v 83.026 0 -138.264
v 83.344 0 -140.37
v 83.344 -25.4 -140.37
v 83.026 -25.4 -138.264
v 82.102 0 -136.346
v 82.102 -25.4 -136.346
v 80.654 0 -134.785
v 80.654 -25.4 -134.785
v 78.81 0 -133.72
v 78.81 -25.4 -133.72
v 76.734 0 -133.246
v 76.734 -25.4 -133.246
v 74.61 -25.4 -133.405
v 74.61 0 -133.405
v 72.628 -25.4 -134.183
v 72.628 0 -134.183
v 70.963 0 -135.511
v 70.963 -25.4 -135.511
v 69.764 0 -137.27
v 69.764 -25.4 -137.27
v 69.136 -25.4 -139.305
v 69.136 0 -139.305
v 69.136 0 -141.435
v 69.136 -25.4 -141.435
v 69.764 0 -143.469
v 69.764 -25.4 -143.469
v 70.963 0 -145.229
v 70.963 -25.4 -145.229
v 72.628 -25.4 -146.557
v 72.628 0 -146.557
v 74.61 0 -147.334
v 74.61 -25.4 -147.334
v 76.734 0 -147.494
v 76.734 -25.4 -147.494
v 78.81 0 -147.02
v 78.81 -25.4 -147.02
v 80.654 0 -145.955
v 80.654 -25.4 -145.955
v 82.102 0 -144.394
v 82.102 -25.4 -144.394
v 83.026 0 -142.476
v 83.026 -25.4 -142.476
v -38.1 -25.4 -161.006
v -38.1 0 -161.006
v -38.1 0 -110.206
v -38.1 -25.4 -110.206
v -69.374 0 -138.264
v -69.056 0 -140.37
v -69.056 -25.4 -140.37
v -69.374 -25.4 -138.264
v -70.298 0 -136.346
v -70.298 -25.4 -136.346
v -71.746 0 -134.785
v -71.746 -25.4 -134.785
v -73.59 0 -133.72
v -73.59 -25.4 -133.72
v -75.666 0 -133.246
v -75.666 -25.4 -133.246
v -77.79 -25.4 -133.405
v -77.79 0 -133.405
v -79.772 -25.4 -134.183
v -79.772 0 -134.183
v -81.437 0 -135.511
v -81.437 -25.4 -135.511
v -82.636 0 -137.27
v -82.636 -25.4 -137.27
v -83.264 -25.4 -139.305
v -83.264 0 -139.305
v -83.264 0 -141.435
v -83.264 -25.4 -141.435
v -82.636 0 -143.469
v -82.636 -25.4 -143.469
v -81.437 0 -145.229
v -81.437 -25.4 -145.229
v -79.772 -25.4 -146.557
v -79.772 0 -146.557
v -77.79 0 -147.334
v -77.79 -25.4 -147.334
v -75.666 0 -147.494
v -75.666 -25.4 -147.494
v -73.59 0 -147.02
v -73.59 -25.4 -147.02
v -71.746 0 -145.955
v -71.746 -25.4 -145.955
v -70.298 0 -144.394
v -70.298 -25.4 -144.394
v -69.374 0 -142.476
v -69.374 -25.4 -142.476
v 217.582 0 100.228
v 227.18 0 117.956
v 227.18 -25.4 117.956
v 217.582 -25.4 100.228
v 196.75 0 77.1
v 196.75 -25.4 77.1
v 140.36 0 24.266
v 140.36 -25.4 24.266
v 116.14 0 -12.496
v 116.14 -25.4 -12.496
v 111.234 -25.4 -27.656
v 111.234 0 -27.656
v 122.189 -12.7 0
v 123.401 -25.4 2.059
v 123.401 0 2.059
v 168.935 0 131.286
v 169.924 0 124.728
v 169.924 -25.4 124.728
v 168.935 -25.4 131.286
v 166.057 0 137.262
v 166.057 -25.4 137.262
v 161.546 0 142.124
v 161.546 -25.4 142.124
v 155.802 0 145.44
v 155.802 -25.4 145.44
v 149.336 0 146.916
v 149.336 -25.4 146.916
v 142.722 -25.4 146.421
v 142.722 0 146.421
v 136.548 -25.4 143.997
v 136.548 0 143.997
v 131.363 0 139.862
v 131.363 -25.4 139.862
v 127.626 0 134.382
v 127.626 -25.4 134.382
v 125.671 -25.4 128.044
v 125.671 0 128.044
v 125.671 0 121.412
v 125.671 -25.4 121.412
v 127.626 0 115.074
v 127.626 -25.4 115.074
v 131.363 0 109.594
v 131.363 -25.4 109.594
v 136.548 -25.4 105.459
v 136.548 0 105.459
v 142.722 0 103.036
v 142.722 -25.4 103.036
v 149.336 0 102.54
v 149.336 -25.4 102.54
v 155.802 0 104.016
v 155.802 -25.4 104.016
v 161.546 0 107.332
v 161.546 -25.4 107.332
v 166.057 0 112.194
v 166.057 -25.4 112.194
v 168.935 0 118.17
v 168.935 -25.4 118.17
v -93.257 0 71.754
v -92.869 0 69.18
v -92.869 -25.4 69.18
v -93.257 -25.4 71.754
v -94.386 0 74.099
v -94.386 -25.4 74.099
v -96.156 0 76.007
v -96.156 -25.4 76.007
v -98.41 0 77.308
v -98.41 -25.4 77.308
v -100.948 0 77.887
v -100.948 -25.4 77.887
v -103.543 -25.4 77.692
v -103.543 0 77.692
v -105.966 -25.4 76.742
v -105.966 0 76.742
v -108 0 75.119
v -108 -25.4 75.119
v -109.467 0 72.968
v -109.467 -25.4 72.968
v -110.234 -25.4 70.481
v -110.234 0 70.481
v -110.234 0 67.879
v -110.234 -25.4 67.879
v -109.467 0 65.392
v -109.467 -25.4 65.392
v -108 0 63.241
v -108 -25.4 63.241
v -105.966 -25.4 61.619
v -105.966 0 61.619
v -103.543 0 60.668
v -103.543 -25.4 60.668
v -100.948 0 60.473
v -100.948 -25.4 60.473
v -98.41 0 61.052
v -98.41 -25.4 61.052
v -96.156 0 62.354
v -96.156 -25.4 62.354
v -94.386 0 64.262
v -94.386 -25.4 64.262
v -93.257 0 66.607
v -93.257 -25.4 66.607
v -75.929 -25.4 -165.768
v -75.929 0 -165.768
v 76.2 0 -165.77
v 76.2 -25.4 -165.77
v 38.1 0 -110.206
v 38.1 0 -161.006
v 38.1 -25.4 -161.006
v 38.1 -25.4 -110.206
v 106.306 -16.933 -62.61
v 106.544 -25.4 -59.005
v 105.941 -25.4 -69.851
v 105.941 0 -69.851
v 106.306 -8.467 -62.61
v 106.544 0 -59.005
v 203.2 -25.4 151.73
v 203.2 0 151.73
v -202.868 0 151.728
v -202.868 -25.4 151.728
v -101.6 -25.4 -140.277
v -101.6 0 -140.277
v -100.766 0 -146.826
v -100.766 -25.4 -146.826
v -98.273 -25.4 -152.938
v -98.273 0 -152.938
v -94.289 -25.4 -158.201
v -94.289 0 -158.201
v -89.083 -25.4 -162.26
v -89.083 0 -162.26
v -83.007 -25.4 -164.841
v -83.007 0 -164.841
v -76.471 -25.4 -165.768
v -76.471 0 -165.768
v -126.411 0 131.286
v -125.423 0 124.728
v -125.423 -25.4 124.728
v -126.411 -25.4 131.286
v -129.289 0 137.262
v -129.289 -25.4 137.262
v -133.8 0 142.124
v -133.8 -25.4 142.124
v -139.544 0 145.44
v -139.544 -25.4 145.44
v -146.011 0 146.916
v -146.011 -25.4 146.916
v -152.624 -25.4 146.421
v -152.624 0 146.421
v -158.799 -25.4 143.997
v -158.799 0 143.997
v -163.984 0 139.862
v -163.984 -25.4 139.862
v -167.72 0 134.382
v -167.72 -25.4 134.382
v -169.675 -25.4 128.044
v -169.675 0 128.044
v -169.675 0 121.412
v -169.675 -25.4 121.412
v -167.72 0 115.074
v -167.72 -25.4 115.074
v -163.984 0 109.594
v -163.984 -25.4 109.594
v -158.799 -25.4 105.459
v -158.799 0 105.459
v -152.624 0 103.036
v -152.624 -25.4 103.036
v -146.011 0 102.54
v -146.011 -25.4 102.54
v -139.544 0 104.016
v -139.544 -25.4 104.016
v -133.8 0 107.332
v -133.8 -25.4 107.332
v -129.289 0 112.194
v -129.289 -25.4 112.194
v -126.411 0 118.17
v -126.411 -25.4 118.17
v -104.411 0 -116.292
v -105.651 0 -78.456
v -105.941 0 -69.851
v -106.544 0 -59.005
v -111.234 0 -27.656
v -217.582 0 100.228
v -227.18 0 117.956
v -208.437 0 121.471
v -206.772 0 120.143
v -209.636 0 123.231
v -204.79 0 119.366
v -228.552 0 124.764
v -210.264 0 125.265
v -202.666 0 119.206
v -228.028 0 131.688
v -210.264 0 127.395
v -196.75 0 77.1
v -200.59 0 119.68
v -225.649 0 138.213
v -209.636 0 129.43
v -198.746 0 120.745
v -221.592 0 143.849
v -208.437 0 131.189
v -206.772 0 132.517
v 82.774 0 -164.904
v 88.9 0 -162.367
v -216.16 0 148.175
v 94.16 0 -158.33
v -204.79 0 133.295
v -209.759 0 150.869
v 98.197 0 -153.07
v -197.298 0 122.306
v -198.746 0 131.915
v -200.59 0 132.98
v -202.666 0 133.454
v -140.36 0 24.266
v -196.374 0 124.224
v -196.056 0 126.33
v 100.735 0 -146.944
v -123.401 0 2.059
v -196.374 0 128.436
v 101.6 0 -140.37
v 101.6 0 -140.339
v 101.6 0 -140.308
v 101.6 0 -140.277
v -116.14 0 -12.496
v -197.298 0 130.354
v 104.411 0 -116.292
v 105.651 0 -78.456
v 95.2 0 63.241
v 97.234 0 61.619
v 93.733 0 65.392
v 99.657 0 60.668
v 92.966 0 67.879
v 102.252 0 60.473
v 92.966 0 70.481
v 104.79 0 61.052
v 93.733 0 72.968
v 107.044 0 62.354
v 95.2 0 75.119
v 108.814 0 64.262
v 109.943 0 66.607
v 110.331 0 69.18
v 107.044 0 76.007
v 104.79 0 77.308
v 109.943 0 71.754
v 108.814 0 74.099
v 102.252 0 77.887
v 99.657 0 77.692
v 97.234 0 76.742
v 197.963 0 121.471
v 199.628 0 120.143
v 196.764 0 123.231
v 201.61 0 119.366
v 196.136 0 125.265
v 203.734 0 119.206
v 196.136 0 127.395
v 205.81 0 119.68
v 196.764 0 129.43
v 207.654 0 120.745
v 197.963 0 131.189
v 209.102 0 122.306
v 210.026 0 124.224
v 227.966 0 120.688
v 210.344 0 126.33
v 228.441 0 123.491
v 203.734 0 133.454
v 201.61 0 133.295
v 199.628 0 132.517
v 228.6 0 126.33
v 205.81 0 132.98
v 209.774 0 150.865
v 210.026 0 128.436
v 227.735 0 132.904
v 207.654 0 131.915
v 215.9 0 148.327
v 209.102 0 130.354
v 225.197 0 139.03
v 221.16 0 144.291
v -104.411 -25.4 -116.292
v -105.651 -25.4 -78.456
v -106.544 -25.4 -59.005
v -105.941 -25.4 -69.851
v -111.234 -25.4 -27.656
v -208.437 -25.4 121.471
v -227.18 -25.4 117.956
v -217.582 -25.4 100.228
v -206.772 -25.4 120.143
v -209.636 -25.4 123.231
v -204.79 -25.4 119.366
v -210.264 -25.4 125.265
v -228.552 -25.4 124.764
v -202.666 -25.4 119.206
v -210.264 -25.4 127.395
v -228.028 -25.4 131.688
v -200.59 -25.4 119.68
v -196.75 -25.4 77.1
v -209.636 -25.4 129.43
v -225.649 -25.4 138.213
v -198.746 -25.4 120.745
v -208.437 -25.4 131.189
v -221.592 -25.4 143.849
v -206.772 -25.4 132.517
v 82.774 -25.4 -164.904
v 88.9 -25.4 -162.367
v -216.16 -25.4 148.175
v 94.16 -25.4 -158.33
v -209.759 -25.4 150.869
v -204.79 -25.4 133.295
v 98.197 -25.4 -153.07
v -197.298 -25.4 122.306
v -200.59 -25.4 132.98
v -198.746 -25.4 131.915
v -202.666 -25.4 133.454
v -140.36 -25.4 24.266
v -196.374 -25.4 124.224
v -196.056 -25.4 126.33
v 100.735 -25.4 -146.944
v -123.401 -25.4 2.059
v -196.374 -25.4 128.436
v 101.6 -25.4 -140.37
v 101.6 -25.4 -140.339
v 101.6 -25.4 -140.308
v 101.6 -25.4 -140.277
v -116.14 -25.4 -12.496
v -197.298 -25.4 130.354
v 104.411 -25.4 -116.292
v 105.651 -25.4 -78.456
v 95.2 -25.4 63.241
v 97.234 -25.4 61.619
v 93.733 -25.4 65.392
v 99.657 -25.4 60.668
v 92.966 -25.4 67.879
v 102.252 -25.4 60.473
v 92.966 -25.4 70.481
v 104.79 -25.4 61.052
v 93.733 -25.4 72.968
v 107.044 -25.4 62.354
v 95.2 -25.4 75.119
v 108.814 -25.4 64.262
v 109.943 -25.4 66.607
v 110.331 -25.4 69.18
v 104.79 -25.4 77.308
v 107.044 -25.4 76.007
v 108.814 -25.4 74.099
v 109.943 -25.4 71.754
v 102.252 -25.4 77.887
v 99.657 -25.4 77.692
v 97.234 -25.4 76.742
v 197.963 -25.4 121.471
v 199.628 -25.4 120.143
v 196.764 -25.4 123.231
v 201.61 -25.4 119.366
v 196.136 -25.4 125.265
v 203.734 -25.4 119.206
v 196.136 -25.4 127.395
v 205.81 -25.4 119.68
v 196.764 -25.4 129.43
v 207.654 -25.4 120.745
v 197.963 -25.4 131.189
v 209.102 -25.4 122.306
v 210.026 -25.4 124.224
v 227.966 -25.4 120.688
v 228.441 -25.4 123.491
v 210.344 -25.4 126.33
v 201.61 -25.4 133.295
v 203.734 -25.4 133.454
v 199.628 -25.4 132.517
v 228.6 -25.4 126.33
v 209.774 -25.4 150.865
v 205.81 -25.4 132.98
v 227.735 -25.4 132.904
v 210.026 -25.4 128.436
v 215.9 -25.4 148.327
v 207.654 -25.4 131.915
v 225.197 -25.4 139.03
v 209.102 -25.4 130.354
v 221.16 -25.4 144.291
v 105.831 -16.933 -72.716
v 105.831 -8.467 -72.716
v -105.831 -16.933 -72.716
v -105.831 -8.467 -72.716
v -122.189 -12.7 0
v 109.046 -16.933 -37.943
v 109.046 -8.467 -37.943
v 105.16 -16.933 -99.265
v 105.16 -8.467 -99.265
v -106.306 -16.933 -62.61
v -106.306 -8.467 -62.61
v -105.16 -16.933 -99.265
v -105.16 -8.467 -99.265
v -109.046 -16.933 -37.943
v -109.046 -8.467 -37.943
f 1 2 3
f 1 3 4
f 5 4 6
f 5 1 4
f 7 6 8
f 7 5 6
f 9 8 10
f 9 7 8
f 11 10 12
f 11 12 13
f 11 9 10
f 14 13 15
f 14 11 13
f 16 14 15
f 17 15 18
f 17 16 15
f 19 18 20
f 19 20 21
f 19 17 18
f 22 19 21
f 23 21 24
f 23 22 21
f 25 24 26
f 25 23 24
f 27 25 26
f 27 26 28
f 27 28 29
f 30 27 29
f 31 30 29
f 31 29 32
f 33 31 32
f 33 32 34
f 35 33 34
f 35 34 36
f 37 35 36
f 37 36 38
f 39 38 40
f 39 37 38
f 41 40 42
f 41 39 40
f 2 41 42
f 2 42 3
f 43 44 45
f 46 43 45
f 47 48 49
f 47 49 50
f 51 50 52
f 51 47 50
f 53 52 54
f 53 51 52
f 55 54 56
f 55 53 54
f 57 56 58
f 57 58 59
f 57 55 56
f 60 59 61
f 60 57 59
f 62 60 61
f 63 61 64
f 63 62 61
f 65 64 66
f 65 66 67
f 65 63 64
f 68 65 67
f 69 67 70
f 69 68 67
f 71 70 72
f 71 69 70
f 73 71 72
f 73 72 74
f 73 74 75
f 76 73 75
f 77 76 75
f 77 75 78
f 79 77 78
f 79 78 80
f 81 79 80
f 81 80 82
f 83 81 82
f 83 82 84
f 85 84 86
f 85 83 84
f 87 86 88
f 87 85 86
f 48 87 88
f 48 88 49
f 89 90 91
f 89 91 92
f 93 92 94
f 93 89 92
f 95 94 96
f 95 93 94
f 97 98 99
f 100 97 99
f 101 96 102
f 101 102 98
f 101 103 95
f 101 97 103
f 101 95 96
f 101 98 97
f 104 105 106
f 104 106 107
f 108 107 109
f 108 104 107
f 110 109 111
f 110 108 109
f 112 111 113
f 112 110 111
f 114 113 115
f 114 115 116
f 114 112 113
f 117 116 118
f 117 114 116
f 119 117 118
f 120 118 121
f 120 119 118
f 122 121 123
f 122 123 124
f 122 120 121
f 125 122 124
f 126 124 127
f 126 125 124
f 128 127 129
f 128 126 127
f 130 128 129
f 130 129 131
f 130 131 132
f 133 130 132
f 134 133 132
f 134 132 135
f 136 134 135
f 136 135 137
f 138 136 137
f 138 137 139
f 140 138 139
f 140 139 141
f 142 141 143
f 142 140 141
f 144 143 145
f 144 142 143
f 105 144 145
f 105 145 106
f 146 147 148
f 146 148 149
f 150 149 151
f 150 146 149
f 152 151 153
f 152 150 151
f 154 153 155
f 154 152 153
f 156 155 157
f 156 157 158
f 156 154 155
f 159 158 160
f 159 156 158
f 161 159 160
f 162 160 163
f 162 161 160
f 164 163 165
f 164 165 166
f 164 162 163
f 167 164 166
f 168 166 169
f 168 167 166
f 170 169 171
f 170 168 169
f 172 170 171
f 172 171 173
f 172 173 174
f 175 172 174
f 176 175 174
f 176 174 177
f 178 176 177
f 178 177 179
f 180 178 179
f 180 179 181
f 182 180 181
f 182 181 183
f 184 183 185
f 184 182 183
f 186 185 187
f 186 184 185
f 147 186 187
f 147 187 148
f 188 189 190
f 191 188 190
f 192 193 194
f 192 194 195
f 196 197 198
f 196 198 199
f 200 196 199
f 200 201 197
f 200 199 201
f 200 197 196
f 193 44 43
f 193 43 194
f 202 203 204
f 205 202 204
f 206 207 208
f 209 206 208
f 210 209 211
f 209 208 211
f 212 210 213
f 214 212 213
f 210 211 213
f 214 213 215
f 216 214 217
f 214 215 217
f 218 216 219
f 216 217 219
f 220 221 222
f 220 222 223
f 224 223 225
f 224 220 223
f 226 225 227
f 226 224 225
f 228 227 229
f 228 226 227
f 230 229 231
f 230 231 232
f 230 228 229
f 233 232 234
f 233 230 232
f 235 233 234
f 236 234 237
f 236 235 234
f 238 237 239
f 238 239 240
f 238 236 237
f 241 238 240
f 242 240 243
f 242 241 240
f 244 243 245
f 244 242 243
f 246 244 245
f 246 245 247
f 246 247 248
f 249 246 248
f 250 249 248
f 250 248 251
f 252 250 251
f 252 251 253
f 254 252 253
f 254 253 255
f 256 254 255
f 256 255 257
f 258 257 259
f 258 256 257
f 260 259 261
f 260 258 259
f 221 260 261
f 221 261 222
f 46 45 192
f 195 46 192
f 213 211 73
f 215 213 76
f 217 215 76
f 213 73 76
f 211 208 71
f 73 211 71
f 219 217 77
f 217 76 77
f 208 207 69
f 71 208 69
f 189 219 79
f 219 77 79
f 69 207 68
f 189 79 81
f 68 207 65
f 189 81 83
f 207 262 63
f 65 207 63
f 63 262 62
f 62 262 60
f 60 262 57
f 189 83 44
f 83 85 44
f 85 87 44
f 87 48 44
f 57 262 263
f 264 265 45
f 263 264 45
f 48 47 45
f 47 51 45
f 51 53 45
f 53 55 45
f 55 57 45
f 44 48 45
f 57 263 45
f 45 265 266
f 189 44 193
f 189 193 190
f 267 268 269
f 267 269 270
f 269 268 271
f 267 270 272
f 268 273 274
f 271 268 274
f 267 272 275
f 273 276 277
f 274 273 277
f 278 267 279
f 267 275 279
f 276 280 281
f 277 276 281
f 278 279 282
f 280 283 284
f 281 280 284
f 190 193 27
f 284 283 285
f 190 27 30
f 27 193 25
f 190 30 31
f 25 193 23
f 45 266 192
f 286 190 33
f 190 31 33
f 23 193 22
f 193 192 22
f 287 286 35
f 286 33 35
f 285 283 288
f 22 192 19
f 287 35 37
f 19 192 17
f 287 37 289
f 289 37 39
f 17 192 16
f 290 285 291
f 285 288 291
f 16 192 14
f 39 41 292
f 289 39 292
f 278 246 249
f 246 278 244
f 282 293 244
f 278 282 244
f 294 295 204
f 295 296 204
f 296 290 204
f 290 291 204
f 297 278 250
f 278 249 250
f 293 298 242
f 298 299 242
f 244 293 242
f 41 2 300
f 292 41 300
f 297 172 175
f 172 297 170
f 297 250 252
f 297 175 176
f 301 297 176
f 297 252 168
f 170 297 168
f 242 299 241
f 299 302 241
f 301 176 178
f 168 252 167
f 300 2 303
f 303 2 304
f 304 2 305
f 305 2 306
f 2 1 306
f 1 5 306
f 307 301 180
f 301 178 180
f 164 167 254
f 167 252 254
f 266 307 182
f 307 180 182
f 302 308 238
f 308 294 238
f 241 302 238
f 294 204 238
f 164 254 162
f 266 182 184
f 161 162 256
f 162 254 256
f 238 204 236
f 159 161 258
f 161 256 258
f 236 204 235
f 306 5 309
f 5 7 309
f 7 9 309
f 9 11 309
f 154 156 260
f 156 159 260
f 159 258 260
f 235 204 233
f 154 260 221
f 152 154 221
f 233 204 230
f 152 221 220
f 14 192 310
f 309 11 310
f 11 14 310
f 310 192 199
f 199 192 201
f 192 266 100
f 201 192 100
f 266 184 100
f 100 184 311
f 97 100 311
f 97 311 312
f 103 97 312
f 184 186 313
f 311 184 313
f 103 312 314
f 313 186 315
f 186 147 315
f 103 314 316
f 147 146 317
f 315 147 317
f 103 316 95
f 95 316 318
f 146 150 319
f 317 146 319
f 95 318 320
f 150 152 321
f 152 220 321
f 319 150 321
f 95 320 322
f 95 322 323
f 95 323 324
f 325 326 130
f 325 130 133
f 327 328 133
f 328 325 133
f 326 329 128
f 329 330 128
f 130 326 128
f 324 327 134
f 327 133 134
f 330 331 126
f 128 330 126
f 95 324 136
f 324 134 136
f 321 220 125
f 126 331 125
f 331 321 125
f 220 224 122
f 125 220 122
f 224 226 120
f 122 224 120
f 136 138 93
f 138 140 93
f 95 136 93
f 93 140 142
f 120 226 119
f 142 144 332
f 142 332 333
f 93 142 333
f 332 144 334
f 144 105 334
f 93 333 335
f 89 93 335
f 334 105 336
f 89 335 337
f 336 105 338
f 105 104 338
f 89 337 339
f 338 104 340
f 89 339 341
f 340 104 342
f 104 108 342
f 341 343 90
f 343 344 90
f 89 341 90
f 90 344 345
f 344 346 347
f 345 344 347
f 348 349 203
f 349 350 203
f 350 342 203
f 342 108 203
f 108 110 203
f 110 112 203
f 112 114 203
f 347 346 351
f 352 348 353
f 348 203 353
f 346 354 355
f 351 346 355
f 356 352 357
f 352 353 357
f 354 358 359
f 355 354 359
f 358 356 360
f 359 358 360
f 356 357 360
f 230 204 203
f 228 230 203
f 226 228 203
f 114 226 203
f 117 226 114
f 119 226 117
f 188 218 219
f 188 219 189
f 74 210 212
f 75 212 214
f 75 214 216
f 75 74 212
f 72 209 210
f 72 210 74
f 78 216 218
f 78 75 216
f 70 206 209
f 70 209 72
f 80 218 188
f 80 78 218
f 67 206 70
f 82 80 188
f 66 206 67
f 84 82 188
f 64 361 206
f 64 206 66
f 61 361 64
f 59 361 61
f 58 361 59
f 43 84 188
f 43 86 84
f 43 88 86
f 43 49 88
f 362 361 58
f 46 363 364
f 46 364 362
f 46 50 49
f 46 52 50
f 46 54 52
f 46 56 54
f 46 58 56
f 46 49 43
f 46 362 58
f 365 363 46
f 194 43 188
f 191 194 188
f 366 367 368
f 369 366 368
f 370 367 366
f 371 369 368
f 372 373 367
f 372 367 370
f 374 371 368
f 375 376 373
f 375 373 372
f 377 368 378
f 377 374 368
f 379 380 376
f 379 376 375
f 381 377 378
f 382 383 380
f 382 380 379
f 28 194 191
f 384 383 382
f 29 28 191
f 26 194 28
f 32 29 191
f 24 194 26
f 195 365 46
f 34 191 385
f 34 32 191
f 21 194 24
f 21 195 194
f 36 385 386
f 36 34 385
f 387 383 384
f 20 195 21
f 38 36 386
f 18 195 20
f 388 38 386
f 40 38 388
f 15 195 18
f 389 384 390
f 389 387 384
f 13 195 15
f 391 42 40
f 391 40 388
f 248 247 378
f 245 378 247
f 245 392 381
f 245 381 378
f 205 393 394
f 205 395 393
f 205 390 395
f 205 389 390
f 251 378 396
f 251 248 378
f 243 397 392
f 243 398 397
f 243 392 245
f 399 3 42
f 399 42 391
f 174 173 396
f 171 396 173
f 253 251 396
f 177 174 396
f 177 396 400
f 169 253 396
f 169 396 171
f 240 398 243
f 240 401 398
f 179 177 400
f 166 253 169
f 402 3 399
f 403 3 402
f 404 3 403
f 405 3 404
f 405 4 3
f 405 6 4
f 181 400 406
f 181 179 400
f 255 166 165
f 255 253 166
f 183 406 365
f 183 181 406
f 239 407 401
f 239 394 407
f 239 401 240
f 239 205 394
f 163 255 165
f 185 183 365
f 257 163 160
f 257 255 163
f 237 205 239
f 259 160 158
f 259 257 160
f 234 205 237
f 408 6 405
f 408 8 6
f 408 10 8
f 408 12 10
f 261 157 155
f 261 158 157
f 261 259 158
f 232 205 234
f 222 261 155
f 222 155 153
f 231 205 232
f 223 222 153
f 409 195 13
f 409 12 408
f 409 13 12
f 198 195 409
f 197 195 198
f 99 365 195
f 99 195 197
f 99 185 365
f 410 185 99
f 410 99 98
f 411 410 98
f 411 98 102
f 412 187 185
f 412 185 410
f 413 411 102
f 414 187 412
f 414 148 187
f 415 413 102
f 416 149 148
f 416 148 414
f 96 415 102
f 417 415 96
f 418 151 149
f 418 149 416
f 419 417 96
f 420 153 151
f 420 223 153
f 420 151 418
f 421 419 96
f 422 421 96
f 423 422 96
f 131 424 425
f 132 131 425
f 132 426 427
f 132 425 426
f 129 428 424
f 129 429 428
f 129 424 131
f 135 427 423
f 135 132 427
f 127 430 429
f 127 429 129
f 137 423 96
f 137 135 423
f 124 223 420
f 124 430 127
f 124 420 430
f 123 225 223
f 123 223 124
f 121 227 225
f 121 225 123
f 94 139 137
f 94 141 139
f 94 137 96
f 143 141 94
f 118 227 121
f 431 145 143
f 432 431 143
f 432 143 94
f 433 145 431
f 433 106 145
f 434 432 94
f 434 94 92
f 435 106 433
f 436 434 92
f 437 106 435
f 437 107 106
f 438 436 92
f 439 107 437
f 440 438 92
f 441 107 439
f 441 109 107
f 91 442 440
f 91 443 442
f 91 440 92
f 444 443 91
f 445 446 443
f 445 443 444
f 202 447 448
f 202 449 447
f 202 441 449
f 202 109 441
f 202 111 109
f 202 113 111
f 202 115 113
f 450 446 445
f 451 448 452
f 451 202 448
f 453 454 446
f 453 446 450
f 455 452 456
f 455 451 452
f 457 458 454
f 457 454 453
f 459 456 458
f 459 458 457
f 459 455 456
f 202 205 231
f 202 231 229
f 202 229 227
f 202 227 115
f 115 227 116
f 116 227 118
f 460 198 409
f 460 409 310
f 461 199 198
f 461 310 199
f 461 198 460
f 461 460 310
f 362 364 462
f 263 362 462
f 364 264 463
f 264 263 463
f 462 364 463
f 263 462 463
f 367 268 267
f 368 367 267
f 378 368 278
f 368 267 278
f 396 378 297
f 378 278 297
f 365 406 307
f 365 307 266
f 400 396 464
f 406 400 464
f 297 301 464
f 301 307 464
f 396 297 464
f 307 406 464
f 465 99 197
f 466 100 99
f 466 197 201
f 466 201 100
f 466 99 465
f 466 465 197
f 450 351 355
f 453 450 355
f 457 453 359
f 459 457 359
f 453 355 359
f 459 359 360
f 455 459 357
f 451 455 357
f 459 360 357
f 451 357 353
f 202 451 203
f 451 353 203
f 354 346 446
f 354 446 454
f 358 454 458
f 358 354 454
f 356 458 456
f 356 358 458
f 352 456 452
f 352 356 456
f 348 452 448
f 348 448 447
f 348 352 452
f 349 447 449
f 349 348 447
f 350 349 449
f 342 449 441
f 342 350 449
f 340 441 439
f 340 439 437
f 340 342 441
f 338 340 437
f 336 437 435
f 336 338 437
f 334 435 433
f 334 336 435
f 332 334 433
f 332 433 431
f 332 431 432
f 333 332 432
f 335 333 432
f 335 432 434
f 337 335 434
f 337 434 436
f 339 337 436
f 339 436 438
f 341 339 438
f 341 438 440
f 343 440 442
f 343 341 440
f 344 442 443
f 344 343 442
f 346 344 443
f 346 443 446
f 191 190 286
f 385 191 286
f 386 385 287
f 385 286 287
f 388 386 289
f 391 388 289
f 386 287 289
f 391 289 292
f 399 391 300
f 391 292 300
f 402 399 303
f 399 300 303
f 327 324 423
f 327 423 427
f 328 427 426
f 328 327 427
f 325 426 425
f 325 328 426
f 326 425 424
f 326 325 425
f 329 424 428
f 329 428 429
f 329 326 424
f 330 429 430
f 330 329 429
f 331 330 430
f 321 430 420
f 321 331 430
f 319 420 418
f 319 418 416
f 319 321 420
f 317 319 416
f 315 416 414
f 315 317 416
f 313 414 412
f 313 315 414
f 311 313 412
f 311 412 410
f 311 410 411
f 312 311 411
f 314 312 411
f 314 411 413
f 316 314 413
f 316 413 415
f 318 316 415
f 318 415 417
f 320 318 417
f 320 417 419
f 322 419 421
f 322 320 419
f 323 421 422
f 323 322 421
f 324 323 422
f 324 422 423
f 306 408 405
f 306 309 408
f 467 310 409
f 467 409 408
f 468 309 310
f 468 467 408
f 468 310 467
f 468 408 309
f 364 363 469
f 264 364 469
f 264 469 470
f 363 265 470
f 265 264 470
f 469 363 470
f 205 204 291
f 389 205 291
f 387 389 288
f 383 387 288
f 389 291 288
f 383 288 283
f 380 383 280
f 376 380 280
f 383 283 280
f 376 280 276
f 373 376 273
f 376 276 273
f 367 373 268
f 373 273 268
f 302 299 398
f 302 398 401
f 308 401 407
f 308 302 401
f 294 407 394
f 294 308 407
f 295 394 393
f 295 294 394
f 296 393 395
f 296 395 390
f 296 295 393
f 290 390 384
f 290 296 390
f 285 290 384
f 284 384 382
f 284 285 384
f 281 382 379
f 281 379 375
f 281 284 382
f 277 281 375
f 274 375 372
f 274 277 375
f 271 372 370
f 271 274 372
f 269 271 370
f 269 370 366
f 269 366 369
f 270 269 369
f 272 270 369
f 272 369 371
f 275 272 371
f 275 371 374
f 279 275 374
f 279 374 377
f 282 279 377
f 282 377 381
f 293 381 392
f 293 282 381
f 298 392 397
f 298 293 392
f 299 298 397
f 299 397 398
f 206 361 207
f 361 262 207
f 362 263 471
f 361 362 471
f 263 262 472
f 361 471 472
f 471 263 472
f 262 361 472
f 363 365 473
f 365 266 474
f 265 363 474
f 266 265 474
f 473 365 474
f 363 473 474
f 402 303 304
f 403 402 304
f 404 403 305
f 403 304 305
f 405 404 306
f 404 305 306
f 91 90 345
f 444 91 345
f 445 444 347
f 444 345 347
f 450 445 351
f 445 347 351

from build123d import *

# Parameters (mm, degrees)
F0_R     = 7.14375
F0_R_2   = 8.73125
F0_R_3   = 22.2504
F0_W     = 76.2
F0_H     = 50.8
F1_DEPTH = 25.4


with BuildPart() as f1:
    # F0 (on Front) → F1 (new body)
    with BuildSketch(Plane.XZ):
        with BuildLine():
            ThreePointArc((-227.1798288962, 117.9559066231), (-198.9530984214, 101.2877007654), (-177.8, 126.3301412811))
            ThreePointArc((-177.8, 126.3301412811), (-185.1223559639, 144.1727528082), (-202.8676209531, 151.7279664669))
            ThreePointArc((-202.8676209531, 151.7279664669), (-223.8140359372, 141.1700038944), (-227.1798288962, 117.9559066231))
        make_face()
        with Locations((-203.2, 126.3301412811)):
            Circle(F0_R, mode=Mode.SUBTRACT)
        with BuildLine():
            ThreePointArc((-202.8676209531, 151.7279664669), (-185.1223559639, 144.1727528082), (-177.8, 126.3301412811))
            ThreePointArc((-177.8, 126.3301412811), (-198.9530984214, 101.2877007654), (-227.1798288962, 117.9559066231))
            add(Edge.make_bspline(
                [(-227.1798288962, 117.9559066231), (-213.6418582626, 78.8128585754), (-134.6303143568, 37.7909136067), (-113.6413747749, -18.1169363843), (-111.2338181852, -27.6559796071)],
                knots=[0, 0, 0, 0, 0.5134678559, 0.6154322526, 0.6154322526, 0.6154322526, 0.6154322526], degree=3))
            Line((-111.2338181852, -27.6559796071), (111.2338181852, -27.6559796071))
            add(Edge.make_bspline(
                [(227.1798288962, 117.9559066231), (213.6418582626, 78.8128585754), (134.6303143568, 37.7909136067), (113.6413747749, -18.1169363843), (111.2338181852, -27.6559796071)],
                knots=[0, 0, 0, 0, 0.5134678559, 0.6154322526, 0.6154322526, 0.6154322526, 0.6154322526], degree=3))
            ThreePointArc((227.1798288962, 117.9559066231), (182.4893469663, 111.6254192192), (203.1998639628, 151.7301412808))
            Line((203.1998639628, 151.7301412808), (-202.8676209531, 151.7279664669))
        make_face()
        with Locations((-101.6, 69.1801412811)):
            Circle(F0_R_2, mode=Mode.SUBTRACT)
        with Locations((-147.6733071194, 124.7280620759)):
            Circle(F0_R_3, mode=Mode.SUBTRACT)
        with Locations((101.6, 69.1801412811)):
            Circle(F0_R_2, mode=Mode.SUBTRACT)
        with Locations((147.6733071194, 124.7280620759)):
            Circle(F0_R_3, mode=Mode.SUBTRACT)
        with BuildLine():
            ThreePointArc((228.6, 126.3301412811), (221.1604641457, 144.2907016196), (203.1998639628, 151.7301412808))
            ThreePointArc((203.1998639628, 151.7301412808), (182.4893469663, 111.6254192192), (227.1798288962, 117.9559066231))
            ThreePointArc((227.1798288962, 117.9559066231), (228.2424405157, 122.0832397026), (228.6, 126.3301412811))
        make_face()
        with Locations((203.2, 126.3301412811)):
            Circle(F0_R, mode=Mode.SUBTRACT)
        with BuildLine():
            Line((111.2338181852, -27.6559796071), (-111.2338181852, -27.6559796071))
            add(Edge.make_bspline(
                [(-111.2338181852, -27.6559796071), (-108.6624430935, -37.8440924207), (-107.3114943085, -48.3473495809), (-106.5439984378, -59.0045117357)],
                knots=[0.6154322526, 0.6154322526, 0.6154322526, 0.6154322526, 0.7243346607, 0.7243346607, 0.7243346607, 0.7243346607], degree=3))
            ThreePointArc((-106.5439984378, -59.0045117357), (-98.7916333235, -57.5943734425), (-94.4499, -64.1698587189))
            ThreePointArc((-94.4499, -64.1698587189), (-98.4312031682, -70.5794341064), (-105.9413914893, -69.8510777735))
            add(Edge.make_bspline(
                [(-105.9413914893, -69.8510777735), (-105.8225617688, -72.7133360171), (-105.7298757075, -75.582653183), (-105.6512856578, -78.4559796071)],
                knots=[0.7611223242, 0.7611223242, 0.7611223242, 0.7611223242, 0.7901378963, 0.7901378963, 0.7901378963, 0.7901378963], degree=3))
            Line((-105.6512856578, -78.4559796071), (105.6512856578, -78.4559796071))
            add(Edge.make_bspline(
                [(105.9413914893, -69.8510777735), (105.8225617688, -72.7133360171), (105.7298757075, -75.582653183), (105.6512856578, -78.4559796071)],
                knots=[0.7611223242, 0.7611223242, 0.7611223242, 0.7611223242, 0.7901378963, 0.7901378963, 0.7901378963, 0.7901378963], degree=3))
            ThreePointArc((105.9413914893, -69.8510777735), (94.4609093557, -63.7732294435), (106.5439984378, -59.0045117357))
            add(Edge.make_bspline(
                [(111.2338181852, -27.6559796071), (108.6624430935, -37.8440924207), (107.3114943085, -48.3473495809), (106.5439984378, -59.0045117357)],
                knots=[0.6154322526, 0.6154322526, 0.6154322526, 0.6154322526, 0.7243346607, 0.7243346607, 0.7243346607, 0.7243346607], degree=3))
        make_face()
        with BuildLine():
            ThreePointArc((-94.4499, -64.1698587189), (-98.7916333235, -57.5943734425), (-106.5439984378, -59.0045117357))
            add(Edge.make_bspline(
                [(-106.5439984378, -59.0045117357), (-106.2847353017, -62.6045431988), (-106.0920508575, -66.2221369929), (-105.9413914893, -69.8510777735)],
                knots=[0.7243346607, 0.7243346607, 0.7243346607, 0.7243346607, 0.7611223242, 0.7611223242, 0.7611223242, 0.7611223242], degree=3))
            ThreePointArc((-105.9413914893, -69.8510777735), (-98.4312031682, -70.5794341064), (-94.4499, -64.1698587189))
        make_face()
        with BuildLine():
            add(Edge.make_bspline(
                [(106.5439984378, -59.0045117357), (106.2847353017, -62.6045431988), (106.0920508575, -66.2221369929), (105.9413914893, -69.8510777735)],
                knots=[0.7243346607, 0.7243346607, 0.7243346607, 0.7243346607, 0.7611223242, 0.7611223242, 0.7611223242, 0.7611223242], degree=3))
            ThreePointArc((106.5439984378, -59.0045117357), (94.4609093557, -63.7732294435), (105.9413914893, -69.8510777735))
        make_face()
        with BuildLine():
            Line((105.6512856578, -78.4559796071), (-105.6512856578, -78.4559796071))
            add(Edge.make_bspline(
                [(-105.6512856578, -78.4559796071), (-105.0828642234, -99.2380039713), (-105.2518408856, -120.2297627942), (-101.5998316324, -140.277376034)],
                knots=[0.7901378963, 0.7901378963, 0.7901378963, 0.7901378963, 1, 1, 1, 1], degree=3))
            ThreePointArc((-101.5998316324, -140.277376034), (-76.1537585809, -114.9699008108), (-50.8, -140.3698587189))
            ThreePointArc((-50.8, -140.3698587189), (-58.1440736415, -158.2344472486), (-75.9294112862, -165.7684173738))
            Line((-75.9294112862, -165.7684173738), (76.1997593484, -165.7698587177))
            ThreePointArc((76.1997593484, -165.7698587177), (58.2069048287, -122.4419886235), (101.5998316324, -140.277376034))
            add(Edge.make_bspline(
                [(105.6512856578, -78.4559796071), (105.0828642234, -99.2380039713), (105.2518408856, -120.2297627942), (101.5998316324, -140.277376034)],
                knots=[0.7901378963, 0.7901378963, 0.7901378963, 0.7901378963, 1, 1, 1, 1], degree=3))
        make_face()
        with Locations((0, -135.6059796071)):
            Rectangle(F0_W, F0_H, mode=Mode.SUBTRACT)
        with BuildLine():
            ThreePointArc((-50.8, -140.3698587189), (-76.1537585809, -114.9699008108), (-101.5998316324, -140.277376034))
            ThreePointArc((-101.5998316324, -140.277376034), (-94.2885883712, -158.2013749399), (-76.4710699897, -165.7684122419))
            Line((-76.4710699897, -165.7684122419), (-75.9294112862, -165.7684173738))
            ThreePointArc((-75.9294112862, -165.7684173738), (-58.1440736415, -158.2344472486), (-50.8, -140.3698587189))
        make_face()
        with Locations((-76.2, -140.3698587189)):
            Circle(F0_R, mode=Mode.SUBTRACT)
        with BuildLine():
            ThreePointArc((101.6, -140.3698587189), (101.5999579081, -140.3236172998), (101.5998316324, -140.277376034))
            ThreePointArc((101.5998316324, -140.277376034), (58.2069048287, -122.4419886235), (76.1997593484, -165.7698587177))
            ThreePointArc((76.1997593484, -165.7698587177), (94.1604271587, -158.330456044), (101.6, -140.3698587189))
        make_face()
        with Locations((76.2, -140.3698587189)):
            Circle(F0_R, mode=Mode.SUBTRACT)
    extrude(amount=F1_DEPTH)


solid = f1.part
